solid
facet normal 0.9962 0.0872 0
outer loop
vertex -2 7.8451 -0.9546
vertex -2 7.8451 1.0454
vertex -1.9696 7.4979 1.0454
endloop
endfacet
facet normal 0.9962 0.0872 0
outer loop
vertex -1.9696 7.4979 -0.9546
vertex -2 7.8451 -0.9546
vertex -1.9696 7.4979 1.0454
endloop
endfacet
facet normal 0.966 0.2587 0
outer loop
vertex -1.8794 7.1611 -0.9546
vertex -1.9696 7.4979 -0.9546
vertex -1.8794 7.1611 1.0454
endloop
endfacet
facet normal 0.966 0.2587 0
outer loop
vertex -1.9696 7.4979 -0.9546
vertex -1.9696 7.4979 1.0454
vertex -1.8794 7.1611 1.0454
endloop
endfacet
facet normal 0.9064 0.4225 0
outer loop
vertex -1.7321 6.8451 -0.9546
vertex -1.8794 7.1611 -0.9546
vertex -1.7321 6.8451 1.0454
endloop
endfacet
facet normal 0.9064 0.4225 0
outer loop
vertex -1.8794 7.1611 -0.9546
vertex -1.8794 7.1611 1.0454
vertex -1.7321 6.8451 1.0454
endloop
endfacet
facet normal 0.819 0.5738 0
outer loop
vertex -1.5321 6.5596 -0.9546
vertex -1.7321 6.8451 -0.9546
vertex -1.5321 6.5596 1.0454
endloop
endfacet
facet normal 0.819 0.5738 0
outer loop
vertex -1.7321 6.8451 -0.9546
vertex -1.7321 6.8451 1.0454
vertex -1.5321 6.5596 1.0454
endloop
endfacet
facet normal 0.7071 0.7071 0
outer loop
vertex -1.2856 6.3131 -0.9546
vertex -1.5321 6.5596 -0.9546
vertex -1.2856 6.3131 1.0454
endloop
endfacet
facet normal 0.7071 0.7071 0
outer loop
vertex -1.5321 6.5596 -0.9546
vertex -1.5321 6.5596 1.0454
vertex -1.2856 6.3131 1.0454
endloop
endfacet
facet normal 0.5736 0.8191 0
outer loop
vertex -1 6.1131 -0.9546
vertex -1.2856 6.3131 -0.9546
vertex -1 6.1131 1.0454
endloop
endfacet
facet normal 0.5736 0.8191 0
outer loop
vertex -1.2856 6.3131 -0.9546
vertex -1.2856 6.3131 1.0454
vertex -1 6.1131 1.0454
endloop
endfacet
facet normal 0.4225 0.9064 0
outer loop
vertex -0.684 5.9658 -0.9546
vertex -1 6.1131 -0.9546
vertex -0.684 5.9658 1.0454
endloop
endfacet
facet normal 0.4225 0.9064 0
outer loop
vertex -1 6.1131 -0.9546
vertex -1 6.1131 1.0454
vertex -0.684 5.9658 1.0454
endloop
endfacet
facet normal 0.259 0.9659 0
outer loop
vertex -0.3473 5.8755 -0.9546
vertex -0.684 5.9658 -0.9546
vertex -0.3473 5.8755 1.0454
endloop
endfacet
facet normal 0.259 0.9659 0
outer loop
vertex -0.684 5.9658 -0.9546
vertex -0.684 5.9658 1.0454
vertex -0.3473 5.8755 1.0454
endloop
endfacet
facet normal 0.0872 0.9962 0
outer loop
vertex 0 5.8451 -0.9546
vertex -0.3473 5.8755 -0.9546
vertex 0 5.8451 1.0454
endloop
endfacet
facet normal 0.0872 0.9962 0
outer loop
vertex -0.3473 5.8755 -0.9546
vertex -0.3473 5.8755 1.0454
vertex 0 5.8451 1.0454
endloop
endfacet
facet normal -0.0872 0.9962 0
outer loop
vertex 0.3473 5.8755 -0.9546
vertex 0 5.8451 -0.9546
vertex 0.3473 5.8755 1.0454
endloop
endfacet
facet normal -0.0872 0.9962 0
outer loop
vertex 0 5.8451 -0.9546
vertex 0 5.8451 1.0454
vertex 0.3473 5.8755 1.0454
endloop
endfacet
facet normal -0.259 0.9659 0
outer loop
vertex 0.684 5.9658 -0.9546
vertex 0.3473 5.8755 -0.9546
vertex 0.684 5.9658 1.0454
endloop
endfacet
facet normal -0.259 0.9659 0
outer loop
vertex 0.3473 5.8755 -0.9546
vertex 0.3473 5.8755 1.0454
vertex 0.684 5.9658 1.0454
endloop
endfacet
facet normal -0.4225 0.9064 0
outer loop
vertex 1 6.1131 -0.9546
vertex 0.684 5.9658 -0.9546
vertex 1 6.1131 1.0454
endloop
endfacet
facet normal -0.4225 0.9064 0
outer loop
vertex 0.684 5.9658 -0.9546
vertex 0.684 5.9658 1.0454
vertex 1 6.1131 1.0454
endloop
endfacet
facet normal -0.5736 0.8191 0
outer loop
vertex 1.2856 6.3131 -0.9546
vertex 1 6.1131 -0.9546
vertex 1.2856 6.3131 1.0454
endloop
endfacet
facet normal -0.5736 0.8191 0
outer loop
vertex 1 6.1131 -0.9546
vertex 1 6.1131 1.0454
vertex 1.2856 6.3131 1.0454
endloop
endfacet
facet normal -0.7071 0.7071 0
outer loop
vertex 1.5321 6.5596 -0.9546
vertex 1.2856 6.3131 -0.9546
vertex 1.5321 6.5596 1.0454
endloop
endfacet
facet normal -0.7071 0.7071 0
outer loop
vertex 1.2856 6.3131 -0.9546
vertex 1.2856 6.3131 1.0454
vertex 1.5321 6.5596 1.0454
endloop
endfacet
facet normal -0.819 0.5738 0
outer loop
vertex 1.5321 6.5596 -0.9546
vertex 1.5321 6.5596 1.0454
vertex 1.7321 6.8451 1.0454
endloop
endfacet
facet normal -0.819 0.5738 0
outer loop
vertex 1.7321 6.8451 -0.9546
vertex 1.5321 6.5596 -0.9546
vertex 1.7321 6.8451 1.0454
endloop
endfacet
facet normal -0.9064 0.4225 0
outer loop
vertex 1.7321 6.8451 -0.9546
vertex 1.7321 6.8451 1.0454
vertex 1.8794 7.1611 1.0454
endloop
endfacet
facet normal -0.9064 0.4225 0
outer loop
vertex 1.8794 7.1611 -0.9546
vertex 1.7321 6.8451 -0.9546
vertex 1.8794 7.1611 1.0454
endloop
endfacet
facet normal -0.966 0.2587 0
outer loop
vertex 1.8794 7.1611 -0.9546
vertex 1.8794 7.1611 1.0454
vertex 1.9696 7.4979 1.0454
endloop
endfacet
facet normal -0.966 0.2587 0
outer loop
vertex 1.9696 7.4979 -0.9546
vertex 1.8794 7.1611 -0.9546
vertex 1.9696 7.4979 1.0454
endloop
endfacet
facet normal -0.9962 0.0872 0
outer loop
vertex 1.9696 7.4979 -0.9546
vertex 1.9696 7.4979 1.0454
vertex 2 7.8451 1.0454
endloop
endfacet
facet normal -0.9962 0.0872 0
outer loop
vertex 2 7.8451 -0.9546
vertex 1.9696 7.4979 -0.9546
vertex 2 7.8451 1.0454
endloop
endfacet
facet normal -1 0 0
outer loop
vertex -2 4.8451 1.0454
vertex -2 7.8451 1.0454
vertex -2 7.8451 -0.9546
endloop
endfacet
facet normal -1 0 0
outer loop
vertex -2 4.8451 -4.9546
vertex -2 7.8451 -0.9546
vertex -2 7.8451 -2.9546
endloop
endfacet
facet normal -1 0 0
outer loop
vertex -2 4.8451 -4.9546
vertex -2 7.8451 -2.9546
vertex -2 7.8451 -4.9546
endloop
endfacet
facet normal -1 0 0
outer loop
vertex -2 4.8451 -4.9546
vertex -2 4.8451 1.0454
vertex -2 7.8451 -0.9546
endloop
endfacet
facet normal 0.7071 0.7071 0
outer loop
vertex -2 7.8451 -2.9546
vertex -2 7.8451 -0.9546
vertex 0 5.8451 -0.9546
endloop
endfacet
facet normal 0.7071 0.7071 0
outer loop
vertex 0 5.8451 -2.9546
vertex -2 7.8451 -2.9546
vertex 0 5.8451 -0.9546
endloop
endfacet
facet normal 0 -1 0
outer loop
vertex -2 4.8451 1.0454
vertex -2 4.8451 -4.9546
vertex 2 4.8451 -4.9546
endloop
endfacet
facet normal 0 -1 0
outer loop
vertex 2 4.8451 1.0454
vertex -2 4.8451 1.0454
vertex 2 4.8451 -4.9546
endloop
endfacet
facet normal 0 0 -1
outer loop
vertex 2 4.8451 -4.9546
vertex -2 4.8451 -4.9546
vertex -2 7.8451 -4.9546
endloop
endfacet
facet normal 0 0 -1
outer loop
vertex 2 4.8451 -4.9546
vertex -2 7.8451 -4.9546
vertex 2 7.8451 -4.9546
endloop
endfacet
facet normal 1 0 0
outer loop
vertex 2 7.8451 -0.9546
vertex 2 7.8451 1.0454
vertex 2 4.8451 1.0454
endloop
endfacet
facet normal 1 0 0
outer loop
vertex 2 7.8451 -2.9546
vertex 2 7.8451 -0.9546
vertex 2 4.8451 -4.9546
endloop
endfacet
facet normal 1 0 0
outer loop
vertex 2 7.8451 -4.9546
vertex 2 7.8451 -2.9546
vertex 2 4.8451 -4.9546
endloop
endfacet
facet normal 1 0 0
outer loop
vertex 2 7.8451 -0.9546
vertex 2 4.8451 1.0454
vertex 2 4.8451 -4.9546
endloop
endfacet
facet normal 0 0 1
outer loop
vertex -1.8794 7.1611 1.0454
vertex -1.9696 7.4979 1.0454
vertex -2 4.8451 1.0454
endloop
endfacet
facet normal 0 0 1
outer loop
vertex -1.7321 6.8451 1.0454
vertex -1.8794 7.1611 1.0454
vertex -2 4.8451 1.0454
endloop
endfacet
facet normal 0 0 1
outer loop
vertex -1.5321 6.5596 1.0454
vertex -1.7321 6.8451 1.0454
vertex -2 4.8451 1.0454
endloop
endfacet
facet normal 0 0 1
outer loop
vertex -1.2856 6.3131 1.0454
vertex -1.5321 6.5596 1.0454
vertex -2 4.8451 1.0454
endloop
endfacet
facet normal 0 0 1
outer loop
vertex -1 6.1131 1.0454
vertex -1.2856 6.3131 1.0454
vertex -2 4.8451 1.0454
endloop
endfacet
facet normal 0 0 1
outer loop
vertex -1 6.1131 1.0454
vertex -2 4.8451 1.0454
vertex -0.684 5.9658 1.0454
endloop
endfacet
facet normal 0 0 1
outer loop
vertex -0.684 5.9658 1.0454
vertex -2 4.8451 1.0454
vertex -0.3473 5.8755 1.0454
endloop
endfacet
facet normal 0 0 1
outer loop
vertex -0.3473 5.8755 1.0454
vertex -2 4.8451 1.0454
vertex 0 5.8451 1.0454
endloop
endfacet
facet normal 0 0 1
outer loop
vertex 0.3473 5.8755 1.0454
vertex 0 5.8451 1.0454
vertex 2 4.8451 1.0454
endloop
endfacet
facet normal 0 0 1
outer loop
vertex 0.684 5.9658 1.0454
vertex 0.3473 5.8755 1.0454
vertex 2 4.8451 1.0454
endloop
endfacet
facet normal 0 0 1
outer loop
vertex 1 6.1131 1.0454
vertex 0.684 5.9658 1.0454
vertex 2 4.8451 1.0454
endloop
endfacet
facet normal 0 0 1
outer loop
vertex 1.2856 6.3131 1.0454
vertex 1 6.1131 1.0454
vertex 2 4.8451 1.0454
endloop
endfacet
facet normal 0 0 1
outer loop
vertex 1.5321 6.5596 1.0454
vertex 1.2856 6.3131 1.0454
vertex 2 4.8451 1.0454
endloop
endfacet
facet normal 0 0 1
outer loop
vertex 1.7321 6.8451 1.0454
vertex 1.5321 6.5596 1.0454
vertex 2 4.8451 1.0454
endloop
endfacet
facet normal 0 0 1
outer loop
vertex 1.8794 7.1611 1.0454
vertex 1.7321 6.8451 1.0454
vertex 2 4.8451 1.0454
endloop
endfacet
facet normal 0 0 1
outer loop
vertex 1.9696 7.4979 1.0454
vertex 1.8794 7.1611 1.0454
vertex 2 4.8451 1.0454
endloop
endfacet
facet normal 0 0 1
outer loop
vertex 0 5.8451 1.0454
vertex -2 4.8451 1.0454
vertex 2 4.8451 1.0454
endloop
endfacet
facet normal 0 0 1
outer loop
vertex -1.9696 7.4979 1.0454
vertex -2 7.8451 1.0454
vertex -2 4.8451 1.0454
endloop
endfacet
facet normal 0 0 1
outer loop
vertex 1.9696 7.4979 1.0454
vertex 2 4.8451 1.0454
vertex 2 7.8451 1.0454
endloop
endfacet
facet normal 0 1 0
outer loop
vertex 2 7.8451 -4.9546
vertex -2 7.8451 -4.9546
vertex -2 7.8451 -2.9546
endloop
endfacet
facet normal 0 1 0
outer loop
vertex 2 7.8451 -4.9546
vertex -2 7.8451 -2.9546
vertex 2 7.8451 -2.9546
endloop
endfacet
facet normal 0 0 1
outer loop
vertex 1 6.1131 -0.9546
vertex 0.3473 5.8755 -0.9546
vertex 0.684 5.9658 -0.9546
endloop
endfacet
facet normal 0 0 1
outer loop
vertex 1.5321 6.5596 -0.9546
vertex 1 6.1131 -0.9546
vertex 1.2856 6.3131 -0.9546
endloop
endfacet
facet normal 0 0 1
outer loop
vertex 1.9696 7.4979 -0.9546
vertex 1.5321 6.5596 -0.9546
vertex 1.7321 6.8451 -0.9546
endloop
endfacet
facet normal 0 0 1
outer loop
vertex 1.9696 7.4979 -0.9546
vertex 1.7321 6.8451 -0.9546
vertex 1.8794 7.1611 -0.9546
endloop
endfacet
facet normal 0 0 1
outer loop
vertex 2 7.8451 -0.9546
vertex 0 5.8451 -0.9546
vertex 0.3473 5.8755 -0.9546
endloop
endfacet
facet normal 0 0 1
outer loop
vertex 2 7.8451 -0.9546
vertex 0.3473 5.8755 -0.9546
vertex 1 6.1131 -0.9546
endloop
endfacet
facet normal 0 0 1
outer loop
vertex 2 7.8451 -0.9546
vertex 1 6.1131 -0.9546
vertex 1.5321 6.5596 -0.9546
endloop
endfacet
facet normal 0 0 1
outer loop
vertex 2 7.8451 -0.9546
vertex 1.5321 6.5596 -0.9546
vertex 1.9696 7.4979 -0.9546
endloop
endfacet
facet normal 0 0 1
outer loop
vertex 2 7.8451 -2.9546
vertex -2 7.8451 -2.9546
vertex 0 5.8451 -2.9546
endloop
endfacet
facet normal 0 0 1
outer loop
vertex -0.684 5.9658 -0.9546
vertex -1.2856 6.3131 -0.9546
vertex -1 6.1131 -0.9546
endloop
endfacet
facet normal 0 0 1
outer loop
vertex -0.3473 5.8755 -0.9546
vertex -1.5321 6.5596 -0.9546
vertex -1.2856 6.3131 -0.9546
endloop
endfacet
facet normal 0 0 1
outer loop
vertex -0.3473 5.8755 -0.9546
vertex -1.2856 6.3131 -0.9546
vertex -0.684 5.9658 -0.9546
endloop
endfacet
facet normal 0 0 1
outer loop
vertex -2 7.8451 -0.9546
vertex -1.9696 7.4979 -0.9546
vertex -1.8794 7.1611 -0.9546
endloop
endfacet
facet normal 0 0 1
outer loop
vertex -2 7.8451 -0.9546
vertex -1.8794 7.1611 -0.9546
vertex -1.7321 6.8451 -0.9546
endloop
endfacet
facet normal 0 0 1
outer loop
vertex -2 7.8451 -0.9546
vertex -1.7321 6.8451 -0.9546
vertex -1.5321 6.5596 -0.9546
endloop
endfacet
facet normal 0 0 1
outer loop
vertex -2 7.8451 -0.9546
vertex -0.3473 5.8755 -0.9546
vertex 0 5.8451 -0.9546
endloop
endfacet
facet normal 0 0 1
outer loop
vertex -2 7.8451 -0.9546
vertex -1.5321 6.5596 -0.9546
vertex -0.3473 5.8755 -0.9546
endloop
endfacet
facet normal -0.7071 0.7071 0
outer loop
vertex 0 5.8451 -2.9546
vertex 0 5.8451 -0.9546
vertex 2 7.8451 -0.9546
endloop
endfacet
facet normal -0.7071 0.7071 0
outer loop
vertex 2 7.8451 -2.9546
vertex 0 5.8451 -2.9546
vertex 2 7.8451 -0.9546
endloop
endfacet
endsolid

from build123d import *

# Parameters (mm, degrees)
SKETCH_1_W          = 20
SKETCH_1_H          = 30
EXTRUDE_1_DEPTH     = 15
CUT_EXTRUDE_1_DEPTH = 10
CUT_EXTRUDE_2_DEPTH = 10
SCALE_1_SCALE       = 0.2


with BuildPart() as part:
    # 草圖1 → 填料-伸長1 (new body)
    with BuildSketch(Plane(origin=(0, 0, 0), x_dir=(1, 0, 0), z_dir=(0, 1, 0))):
        Rectangle(SKETCH_1_W, SKETCH_1_H)
    extrude(amount=EXTRUDE_1_DEPTH)

    # 草圖2 → 除料-伸長1 (cut)
    with BuildSketch(Plane.XY.offset(15)):
        with BuildLine():
            Line((10, 15), (-10, 15))
            ThreePointArc((-10, 15), (0, 5), (10, 15))
        make_face()
    extrude(amount=-CUT_EXTRUDE_1_DEPTH, mode=Mode.SUBTRACT)

    # 草圖3 → 除料-伸長2 (cut)
    with BuildSketch(Plane.XY.offset(5)):
        Polygon((-10, 15), (0, 5), (10, 15), align=None)
    extrude(amount=-CUT_EXTRUDE_2_DEPTH, mode=Mode.SUBTRACT)


with BuildPart() as part_1:
    # 縮放比例1: scaled about (0, 6.056435148, -2.443220664)
    add(part.part.scale(SCALE_1_SCALE).moved(Location((0, 4.845148118, -1.954576531))))


solid = part_1.part
